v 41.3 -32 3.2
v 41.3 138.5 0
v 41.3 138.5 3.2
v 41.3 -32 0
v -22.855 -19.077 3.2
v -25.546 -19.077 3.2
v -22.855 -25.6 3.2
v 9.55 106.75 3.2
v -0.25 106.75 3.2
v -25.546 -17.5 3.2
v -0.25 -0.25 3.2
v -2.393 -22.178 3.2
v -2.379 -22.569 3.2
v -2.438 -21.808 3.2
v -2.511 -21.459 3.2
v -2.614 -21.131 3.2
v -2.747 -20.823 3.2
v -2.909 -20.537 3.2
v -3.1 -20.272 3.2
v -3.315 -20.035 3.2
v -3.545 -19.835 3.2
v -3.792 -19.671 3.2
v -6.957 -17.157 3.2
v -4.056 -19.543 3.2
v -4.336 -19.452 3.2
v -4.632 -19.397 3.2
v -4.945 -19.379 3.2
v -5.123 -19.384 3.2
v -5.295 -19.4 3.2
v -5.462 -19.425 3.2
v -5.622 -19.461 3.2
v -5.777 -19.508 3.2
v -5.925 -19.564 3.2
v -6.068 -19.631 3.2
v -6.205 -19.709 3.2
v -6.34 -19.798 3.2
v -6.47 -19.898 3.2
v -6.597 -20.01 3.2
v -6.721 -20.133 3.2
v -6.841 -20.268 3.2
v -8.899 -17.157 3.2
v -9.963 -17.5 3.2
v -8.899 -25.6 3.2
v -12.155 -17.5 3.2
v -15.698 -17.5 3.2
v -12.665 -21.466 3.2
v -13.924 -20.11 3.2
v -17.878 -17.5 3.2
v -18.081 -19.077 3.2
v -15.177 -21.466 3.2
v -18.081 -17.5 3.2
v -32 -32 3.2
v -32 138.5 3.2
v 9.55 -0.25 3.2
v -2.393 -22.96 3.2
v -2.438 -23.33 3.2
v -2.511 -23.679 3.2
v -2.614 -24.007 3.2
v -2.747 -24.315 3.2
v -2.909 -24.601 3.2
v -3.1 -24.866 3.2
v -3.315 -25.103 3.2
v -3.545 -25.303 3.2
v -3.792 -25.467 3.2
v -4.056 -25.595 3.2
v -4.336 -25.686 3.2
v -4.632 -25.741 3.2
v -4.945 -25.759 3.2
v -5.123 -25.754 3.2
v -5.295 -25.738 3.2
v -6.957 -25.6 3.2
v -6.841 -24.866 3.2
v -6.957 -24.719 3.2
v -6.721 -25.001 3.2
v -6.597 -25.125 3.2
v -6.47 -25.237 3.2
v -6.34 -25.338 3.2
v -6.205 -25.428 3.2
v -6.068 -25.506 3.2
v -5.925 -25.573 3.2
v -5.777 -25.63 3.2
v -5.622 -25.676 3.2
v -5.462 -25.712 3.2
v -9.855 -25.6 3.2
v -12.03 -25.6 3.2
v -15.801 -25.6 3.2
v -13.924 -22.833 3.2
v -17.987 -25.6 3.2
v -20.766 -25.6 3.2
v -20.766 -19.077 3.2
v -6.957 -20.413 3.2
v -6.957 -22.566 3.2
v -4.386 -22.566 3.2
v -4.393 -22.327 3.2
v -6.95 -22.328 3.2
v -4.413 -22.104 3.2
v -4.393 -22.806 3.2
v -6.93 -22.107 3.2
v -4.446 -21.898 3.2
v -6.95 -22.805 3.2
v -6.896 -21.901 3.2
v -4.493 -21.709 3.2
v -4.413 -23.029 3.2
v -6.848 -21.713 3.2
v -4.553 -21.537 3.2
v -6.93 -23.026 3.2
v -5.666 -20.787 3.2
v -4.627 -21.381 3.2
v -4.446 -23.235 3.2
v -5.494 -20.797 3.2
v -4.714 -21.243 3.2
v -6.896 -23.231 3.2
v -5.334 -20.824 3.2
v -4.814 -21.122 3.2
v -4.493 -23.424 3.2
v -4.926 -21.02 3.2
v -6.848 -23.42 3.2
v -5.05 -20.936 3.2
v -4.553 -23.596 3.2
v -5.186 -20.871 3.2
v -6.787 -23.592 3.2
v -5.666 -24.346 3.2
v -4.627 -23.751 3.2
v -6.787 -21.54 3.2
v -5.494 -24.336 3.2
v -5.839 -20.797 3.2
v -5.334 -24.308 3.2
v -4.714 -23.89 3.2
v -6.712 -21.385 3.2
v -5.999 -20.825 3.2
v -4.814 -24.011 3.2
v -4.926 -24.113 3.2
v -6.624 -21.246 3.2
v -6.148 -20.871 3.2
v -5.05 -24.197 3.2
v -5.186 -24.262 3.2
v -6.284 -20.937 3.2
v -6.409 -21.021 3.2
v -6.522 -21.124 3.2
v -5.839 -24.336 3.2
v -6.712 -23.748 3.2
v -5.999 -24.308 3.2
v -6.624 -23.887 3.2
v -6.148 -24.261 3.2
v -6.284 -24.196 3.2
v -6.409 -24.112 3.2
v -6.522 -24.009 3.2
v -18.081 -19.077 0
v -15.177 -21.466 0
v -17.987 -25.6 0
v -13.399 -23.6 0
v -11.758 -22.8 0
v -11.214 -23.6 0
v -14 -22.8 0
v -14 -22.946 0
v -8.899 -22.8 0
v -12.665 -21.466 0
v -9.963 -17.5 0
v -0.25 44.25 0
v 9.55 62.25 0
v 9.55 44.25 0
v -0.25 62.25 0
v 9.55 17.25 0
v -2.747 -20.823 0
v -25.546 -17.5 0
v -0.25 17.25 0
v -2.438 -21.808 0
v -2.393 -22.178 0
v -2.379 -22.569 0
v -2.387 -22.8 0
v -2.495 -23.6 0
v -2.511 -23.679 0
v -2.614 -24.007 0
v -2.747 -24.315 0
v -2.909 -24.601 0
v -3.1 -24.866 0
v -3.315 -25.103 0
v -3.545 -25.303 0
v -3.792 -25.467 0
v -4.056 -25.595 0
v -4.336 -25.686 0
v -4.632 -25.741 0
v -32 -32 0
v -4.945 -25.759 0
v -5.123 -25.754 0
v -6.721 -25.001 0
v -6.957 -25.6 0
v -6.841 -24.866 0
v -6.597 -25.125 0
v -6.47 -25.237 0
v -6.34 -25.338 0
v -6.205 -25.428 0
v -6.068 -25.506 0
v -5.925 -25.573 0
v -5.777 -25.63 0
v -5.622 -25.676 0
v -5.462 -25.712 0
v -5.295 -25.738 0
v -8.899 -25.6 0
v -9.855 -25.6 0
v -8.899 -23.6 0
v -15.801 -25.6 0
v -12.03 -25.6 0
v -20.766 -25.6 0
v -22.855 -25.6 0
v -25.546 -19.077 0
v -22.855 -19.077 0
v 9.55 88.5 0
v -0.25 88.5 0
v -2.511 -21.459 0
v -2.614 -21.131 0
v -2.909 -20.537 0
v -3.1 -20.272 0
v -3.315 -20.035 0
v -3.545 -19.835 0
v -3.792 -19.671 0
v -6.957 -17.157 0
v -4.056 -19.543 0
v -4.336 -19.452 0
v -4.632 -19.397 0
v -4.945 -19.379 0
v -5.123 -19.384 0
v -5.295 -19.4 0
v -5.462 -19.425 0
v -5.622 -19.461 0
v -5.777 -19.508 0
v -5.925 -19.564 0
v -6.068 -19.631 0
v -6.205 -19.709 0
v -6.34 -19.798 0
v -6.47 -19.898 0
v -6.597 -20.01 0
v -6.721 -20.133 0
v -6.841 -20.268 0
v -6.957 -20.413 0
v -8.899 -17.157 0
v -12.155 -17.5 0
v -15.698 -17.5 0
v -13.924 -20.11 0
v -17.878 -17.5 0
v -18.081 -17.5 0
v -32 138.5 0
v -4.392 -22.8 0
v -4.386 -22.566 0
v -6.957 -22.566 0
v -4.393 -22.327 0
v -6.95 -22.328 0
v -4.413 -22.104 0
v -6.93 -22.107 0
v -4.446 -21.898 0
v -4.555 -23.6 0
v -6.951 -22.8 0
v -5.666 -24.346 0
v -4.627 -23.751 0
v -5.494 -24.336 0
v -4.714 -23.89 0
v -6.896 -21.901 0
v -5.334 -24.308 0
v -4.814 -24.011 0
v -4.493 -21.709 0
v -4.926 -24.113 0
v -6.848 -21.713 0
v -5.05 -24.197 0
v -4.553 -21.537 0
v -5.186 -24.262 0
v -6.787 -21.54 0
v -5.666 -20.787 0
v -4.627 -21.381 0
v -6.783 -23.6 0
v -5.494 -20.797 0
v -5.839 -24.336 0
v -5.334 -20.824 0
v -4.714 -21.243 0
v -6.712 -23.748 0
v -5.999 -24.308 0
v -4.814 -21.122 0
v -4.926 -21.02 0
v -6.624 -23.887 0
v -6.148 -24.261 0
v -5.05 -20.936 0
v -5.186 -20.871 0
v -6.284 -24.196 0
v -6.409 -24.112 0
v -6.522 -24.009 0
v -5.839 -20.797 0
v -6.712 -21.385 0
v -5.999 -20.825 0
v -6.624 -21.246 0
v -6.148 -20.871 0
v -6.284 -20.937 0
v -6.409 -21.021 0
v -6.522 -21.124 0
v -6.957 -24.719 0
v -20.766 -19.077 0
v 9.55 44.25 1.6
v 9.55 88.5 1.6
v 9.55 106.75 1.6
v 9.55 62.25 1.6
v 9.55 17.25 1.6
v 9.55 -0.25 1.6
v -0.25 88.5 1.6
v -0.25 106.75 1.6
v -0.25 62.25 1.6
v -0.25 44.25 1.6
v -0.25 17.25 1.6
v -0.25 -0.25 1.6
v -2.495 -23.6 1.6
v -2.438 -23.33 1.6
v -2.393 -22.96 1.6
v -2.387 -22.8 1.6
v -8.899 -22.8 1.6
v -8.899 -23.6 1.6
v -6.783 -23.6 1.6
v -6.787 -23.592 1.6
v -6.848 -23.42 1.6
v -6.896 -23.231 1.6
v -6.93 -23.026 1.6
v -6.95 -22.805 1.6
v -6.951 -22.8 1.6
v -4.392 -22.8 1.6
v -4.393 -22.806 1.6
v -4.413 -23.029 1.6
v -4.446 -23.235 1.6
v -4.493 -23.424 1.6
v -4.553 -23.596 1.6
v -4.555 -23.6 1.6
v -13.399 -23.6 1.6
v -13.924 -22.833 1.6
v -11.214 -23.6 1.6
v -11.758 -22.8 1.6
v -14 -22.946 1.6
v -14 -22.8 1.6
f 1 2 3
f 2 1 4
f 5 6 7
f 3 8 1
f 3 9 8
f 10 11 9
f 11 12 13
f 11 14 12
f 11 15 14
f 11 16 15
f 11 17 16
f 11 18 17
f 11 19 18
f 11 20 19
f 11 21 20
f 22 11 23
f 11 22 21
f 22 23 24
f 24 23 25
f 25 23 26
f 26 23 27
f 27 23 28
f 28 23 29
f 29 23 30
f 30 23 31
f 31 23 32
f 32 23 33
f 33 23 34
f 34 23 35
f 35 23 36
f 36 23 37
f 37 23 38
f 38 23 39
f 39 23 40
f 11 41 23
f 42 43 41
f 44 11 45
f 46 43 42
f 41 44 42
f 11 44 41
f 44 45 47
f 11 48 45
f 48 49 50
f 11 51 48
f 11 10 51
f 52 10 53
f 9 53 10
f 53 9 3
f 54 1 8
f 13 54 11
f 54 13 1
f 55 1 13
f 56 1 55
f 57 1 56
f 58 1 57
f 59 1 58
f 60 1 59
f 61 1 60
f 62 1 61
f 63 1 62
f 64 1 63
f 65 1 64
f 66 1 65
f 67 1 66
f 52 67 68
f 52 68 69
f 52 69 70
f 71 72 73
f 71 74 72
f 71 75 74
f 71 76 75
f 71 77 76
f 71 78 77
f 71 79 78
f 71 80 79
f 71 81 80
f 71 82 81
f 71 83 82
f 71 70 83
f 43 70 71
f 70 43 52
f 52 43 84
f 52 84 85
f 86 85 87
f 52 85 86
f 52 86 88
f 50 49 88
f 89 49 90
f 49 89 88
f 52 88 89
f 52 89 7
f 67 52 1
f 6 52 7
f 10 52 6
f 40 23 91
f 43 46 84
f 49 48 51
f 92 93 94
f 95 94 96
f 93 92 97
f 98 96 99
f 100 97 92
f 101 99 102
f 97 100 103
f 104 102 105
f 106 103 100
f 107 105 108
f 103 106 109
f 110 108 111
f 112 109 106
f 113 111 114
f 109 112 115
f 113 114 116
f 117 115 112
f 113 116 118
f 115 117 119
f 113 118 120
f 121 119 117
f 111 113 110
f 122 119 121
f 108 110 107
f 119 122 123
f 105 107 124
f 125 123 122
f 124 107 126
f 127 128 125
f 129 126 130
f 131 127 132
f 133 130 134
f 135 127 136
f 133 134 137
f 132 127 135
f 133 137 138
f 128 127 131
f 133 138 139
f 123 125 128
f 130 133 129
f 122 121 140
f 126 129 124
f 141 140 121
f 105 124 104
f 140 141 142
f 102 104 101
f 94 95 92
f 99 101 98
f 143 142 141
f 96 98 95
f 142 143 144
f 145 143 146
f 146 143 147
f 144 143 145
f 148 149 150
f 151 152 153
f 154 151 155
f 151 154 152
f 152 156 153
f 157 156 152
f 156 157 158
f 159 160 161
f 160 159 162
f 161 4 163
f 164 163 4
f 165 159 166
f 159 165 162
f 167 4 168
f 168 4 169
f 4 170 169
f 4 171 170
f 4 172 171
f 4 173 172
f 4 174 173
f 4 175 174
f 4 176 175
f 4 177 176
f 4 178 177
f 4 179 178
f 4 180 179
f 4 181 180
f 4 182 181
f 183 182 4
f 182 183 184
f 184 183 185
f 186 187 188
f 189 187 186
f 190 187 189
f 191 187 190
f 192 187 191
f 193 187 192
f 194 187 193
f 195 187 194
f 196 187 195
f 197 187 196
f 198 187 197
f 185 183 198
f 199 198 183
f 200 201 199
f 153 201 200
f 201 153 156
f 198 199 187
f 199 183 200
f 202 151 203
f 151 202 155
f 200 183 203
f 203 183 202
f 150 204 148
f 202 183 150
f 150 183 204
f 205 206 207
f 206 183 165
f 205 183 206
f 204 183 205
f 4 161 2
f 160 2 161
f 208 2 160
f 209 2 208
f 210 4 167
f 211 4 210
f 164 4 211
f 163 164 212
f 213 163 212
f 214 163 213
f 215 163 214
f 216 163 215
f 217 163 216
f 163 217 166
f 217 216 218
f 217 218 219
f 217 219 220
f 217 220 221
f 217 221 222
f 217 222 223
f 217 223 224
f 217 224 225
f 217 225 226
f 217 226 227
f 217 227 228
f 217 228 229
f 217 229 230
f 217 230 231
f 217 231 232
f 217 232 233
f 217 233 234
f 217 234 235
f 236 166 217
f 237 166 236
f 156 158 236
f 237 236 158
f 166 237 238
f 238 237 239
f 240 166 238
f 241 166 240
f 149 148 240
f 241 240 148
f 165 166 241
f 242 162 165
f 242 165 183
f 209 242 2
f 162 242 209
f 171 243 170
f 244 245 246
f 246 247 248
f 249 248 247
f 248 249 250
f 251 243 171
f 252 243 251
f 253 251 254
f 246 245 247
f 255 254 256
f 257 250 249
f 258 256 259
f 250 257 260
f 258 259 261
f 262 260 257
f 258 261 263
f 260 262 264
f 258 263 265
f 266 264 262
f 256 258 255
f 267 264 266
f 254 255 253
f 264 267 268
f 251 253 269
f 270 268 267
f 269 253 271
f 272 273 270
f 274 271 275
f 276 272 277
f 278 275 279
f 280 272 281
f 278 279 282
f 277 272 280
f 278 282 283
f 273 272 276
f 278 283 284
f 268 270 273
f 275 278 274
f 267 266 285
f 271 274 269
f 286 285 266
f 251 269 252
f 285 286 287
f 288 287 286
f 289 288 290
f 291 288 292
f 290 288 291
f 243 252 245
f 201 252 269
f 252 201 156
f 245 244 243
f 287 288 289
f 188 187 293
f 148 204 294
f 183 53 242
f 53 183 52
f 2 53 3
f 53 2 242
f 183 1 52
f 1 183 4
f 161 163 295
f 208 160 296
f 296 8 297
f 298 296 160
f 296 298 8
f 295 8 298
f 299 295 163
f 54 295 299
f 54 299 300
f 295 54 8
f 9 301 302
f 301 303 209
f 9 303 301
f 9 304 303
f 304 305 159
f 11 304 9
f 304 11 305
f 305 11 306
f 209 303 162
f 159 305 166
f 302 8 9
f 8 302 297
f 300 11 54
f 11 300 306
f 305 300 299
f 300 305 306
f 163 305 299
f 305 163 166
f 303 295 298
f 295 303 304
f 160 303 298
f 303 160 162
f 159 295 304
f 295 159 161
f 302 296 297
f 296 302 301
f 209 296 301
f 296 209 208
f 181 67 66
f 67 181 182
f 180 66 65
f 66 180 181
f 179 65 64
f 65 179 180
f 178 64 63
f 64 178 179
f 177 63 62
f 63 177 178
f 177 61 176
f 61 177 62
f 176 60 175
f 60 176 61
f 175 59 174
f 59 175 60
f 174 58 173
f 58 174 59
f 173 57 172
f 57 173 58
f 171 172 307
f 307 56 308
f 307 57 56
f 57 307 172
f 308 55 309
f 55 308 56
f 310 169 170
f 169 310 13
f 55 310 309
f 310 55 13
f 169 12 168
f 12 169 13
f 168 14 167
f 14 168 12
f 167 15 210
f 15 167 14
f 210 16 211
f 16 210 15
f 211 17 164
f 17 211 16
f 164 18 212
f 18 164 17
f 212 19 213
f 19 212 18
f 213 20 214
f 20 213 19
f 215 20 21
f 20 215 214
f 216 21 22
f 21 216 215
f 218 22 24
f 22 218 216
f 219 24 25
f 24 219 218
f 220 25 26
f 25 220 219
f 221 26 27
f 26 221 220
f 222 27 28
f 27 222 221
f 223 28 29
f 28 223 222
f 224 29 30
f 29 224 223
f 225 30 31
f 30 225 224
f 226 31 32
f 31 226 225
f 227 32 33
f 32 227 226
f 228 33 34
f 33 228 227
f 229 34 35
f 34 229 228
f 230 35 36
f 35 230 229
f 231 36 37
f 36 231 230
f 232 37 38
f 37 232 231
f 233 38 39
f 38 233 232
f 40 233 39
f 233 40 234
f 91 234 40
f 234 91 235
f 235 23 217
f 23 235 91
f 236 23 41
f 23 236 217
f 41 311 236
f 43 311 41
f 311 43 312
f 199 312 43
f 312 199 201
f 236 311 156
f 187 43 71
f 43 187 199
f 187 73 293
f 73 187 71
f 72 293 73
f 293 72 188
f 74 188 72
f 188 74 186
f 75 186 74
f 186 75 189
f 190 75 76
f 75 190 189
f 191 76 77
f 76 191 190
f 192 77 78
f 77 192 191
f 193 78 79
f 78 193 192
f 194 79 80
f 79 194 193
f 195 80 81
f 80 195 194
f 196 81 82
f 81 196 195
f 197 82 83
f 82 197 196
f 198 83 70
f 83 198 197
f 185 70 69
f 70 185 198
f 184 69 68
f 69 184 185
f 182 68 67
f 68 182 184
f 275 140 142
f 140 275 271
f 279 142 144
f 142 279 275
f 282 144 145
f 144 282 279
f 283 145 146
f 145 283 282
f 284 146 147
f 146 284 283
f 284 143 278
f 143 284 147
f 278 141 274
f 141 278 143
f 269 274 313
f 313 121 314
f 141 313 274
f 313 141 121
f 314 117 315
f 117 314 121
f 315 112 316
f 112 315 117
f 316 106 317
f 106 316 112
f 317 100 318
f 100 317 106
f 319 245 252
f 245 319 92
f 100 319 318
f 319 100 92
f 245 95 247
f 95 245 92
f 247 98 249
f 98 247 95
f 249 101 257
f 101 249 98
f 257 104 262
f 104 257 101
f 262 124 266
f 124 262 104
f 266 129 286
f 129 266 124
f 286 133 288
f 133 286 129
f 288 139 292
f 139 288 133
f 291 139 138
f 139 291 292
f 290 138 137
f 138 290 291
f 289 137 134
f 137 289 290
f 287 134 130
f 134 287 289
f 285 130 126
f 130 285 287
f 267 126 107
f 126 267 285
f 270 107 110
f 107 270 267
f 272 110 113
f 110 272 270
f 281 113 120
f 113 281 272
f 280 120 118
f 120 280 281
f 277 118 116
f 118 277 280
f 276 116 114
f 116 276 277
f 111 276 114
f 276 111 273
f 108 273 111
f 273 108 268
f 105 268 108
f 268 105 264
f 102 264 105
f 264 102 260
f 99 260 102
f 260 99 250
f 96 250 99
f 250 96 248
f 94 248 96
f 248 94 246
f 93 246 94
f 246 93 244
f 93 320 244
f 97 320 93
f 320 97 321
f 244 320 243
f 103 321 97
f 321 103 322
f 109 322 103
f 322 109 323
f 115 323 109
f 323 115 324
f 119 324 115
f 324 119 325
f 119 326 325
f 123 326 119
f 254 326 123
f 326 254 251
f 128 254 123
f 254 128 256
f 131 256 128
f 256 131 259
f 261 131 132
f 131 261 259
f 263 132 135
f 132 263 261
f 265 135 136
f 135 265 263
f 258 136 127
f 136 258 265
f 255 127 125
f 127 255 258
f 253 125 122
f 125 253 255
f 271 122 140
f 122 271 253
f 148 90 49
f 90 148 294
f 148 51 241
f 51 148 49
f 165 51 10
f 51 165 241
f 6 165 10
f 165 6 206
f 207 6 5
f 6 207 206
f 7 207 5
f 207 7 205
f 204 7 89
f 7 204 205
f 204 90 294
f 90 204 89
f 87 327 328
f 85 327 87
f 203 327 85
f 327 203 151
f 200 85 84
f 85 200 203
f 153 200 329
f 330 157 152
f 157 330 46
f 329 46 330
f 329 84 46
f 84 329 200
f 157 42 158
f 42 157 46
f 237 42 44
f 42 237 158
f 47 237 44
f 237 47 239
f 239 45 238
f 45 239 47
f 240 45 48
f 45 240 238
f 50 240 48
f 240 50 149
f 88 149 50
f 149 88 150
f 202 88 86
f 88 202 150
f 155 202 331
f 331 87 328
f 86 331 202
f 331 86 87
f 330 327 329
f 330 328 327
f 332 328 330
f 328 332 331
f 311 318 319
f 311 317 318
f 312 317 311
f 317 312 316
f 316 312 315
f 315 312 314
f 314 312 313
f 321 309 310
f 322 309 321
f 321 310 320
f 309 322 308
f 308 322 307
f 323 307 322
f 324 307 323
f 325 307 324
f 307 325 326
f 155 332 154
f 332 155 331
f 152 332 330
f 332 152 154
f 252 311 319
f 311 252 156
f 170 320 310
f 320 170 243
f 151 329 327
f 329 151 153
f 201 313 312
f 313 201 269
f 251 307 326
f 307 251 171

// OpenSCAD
$fn = 50;

// TXo Bottom

tolerance = .5;

pcbX = 9.3;
pcbY = 106.5;
pcbZ = 1.6;

frame = 32;

barOneStart = 0;
barOneEnd = 18;

barTwoStart = pcbY / 2 - 9;
barTwoEnd = barTwoStart + 18;

barThreeStart = pcbY - 18;
barThreeEnd = 107.01 + (tolerance / 2);

corner = 2.5;

difference(){

    union(){
        difference() {
            translate([-frame, - frame, 0])
                cube([pcbX + 2 * frame, pcbY + 2 * frame, 2 * pcbZ]);
            translate([-tolerance/2, -tolerance/2, 0])
                cube([pcbX + tolerance, pcbY + tolerance, 2 * pcbZ]);
        }

        translate([-tolerance/2, barOneStart-(tolerance/2), 0])
            cube([pcbX + tolerance, barOneEnd - barOneStart -tolerance, pcbZ]);
            
        translate([-tolerance/2, barTwoStart, 0])
            cube([pcbX + tolerance, barTwoEnd - barTwoStart, pcbZ]);
        
        translate([-tolerance/2, barThreeStart, 0])
            cube([pcbX + tolerance, barThreeEnd - barThreeStart, pcbZ]);

    }

     translate([-frame * .8, -frame * .8]) {
       linear_extrude(height = 2 * pcbZ)
        text("TXb", font = "Core Humanist Sans:style=Bold", size = 8);
     }
 
 }

    translate([-14, (-frame * .8) + 2])
        cube([12, .8, pcbZ]);

/*

translate([-13,-frame * .74,0])
    cube([10, pcbZ * .5, pcbZ / 3]);


translate([-4,-frame * .655,0])
    cube([8, pcbZ * .4, pcbZ / 3]);
 
translate([-4,-frame * .755,0])
    cube([7, pcbZ * .4, pcbZ / 3]);

translate([3,-frame * .74,0])
    cube([7, pcbZ * .4, pcbZ / 3]);
 
translate([18,-frame * .74,0])
    cube([7, pcbZ * .4, pcbZ / 3]);
 
 */               
